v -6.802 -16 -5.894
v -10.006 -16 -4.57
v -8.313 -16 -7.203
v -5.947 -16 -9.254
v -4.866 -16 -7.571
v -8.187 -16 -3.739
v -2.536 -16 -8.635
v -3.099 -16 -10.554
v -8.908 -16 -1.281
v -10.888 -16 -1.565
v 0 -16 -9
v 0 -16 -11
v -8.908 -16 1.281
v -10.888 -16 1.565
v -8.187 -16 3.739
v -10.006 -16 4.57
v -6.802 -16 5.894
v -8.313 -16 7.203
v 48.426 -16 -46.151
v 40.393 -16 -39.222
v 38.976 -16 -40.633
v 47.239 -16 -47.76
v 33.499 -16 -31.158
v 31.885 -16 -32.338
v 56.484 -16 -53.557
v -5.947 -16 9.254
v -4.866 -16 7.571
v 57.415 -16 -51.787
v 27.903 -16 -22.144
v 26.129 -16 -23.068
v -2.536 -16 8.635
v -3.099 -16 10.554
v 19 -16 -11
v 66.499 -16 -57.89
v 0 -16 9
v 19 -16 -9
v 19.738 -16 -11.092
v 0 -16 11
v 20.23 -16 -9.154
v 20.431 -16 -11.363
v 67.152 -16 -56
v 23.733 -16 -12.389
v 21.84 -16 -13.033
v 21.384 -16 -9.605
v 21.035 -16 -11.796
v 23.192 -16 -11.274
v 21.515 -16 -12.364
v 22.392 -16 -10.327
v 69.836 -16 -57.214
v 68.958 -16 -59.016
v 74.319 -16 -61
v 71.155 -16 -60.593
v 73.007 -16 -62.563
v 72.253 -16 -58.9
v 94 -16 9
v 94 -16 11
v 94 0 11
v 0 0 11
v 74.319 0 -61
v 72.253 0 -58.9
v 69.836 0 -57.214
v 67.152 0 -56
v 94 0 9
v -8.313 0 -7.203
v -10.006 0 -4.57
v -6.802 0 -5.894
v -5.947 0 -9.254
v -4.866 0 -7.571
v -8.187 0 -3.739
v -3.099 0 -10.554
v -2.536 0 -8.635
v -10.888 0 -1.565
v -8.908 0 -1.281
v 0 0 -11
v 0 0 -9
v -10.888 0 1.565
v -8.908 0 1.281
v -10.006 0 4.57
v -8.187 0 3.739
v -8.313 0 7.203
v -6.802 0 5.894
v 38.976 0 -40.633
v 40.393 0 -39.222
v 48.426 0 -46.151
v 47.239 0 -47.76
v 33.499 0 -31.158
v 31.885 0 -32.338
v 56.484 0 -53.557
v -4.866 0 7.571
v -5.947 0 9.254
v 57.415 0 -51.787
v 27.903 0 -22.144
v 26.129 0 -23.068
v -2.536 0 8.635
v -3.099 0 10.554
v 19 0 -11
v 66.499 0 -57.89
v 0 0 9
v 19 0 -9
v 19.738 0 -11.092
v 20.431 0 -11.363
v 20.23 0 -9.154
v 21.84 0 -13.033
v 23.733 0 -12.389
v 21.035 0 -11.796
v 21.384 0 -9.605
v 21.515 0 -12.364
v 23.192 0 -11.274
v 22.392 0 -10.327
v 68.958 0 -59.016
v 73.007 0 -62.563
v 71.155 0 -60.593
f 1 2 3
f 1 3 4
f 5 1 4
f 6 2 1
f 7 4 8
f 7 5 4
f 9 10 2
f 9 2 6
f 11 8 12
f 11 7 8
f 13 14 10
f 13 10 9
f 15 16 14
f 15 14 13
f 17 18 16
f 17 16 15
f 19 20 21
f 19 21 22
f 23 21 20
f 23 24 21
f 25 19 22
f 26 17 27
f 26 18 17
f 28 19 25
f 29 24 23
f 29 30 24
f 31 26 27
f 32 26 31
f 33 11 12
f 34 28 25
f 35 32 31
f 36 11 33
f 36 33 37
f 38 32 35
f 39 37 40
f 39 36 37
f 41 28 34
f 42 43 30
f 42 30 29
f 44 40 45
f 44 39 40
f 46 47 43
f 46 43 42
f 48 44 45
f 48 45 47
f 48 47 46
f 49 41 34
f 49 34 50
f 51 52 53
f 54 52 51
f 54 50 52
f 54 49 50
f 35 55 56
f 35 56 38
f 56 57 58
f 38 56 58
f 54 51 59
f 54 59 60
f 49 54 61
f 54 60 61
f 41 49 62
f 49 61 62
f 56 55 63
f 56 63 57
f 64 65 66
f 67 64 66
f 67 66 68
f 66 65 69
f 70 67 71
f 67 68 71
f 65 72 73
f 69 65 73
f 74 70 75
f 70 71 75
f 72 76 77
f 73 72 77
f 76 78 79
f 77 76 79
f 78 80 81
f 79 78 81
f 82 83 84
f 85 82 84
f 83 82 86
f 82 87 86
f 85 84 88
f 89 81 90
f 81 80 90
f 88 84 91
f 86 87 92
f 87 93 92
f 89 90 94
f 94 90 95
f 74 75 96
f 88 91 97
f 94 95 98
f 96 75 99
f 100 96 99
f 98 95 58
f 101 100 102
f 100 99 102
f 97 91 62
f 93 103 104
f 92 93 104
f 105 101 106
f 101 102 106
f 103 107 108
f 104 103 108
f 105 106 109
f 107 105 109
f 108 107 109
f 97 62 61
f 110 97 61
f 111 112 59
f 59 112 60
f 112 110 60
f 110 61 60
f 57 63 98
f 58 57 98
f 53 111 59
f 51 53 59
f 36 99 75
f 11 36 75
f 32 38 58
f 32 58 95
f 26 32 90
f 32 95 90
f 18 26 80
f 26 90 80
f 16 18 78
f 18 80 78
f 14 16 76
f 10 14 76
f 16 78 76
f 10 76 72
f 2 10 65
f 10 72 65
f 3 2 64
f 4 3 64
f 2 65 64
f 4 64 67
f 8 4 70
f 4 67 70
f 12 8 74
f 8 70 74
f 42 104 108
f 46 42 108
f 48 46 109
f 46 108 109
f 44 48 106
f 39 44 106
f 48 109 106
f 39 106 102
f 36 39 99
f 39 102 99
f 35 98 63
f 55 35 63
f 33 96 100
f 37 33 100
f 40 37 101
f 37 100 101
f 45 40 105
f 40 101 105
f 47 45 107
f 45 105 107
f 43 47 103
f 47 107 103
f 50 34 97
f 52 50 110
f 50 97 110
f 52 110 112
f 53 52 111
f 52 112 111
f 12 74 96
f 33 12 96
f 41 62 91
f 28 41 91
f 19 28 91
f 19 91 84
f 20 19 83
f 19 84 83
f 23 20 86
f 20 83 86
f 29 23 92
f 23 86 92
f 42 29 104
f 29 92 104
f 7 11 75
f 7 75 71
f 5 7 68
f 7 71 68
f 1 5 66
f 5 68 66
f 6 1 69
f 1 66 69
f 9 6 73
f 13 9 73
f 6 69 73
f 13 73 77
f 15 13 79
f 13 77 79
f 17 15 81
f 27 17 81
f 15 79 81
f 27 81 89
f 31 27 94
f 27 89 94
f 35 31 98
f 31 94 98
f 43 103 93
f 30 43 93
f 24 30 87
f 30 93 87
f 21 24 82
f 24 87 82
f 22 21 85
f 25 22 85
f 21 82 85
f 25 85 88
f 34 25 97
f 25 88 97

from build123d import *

# Parameters (mm, degrees)
F1_DEPTH = 16


with BuildPart() as f1:
    # F0 (on Front) → F1 (new body)
    with BuildSketch(Plane.XZ):
        with BuildLine():
            ThreePointArc((0, -9), (-9, 0), (0, 9))
            Line((0, 9), (94, 9))
            Line((94, 9), (94, 11))
            Line((94, 11), (0, 11))
            ThreePointArc((0, 11), (-11, 0), (0, -11))
            Line((0, -11), (19, -11))
            ThreePointArc((19, -11), (20.746435, -11.560745), (21.84, -13.033356))
            ThreePointArc((21.84, -13.033356), (38.975661, -40.632695), (66.498813, -57.89046))
            ThreePointArc((66.498813, -57.89046), (70.094434, -59.751434), (73.007182, -62.563483))
            Line((73.007182, -62.563483), (74.3191, -61))
            ThreePointArc((74.3191, -61), (71.083349, -58.001162), (67.151624, -56))
            ThreePointArc((67.151624, -56), (40.393003, -39.221618), (23.733333, -12.388927))
            ThreePointArc((23.733333, -12.388927), (21.910725, -9.934575), (19, -9))
            Line((19, -9), (0, -9))
        make_face()
    extrude(amount=F1_DEPTH)


solid = f1.part
